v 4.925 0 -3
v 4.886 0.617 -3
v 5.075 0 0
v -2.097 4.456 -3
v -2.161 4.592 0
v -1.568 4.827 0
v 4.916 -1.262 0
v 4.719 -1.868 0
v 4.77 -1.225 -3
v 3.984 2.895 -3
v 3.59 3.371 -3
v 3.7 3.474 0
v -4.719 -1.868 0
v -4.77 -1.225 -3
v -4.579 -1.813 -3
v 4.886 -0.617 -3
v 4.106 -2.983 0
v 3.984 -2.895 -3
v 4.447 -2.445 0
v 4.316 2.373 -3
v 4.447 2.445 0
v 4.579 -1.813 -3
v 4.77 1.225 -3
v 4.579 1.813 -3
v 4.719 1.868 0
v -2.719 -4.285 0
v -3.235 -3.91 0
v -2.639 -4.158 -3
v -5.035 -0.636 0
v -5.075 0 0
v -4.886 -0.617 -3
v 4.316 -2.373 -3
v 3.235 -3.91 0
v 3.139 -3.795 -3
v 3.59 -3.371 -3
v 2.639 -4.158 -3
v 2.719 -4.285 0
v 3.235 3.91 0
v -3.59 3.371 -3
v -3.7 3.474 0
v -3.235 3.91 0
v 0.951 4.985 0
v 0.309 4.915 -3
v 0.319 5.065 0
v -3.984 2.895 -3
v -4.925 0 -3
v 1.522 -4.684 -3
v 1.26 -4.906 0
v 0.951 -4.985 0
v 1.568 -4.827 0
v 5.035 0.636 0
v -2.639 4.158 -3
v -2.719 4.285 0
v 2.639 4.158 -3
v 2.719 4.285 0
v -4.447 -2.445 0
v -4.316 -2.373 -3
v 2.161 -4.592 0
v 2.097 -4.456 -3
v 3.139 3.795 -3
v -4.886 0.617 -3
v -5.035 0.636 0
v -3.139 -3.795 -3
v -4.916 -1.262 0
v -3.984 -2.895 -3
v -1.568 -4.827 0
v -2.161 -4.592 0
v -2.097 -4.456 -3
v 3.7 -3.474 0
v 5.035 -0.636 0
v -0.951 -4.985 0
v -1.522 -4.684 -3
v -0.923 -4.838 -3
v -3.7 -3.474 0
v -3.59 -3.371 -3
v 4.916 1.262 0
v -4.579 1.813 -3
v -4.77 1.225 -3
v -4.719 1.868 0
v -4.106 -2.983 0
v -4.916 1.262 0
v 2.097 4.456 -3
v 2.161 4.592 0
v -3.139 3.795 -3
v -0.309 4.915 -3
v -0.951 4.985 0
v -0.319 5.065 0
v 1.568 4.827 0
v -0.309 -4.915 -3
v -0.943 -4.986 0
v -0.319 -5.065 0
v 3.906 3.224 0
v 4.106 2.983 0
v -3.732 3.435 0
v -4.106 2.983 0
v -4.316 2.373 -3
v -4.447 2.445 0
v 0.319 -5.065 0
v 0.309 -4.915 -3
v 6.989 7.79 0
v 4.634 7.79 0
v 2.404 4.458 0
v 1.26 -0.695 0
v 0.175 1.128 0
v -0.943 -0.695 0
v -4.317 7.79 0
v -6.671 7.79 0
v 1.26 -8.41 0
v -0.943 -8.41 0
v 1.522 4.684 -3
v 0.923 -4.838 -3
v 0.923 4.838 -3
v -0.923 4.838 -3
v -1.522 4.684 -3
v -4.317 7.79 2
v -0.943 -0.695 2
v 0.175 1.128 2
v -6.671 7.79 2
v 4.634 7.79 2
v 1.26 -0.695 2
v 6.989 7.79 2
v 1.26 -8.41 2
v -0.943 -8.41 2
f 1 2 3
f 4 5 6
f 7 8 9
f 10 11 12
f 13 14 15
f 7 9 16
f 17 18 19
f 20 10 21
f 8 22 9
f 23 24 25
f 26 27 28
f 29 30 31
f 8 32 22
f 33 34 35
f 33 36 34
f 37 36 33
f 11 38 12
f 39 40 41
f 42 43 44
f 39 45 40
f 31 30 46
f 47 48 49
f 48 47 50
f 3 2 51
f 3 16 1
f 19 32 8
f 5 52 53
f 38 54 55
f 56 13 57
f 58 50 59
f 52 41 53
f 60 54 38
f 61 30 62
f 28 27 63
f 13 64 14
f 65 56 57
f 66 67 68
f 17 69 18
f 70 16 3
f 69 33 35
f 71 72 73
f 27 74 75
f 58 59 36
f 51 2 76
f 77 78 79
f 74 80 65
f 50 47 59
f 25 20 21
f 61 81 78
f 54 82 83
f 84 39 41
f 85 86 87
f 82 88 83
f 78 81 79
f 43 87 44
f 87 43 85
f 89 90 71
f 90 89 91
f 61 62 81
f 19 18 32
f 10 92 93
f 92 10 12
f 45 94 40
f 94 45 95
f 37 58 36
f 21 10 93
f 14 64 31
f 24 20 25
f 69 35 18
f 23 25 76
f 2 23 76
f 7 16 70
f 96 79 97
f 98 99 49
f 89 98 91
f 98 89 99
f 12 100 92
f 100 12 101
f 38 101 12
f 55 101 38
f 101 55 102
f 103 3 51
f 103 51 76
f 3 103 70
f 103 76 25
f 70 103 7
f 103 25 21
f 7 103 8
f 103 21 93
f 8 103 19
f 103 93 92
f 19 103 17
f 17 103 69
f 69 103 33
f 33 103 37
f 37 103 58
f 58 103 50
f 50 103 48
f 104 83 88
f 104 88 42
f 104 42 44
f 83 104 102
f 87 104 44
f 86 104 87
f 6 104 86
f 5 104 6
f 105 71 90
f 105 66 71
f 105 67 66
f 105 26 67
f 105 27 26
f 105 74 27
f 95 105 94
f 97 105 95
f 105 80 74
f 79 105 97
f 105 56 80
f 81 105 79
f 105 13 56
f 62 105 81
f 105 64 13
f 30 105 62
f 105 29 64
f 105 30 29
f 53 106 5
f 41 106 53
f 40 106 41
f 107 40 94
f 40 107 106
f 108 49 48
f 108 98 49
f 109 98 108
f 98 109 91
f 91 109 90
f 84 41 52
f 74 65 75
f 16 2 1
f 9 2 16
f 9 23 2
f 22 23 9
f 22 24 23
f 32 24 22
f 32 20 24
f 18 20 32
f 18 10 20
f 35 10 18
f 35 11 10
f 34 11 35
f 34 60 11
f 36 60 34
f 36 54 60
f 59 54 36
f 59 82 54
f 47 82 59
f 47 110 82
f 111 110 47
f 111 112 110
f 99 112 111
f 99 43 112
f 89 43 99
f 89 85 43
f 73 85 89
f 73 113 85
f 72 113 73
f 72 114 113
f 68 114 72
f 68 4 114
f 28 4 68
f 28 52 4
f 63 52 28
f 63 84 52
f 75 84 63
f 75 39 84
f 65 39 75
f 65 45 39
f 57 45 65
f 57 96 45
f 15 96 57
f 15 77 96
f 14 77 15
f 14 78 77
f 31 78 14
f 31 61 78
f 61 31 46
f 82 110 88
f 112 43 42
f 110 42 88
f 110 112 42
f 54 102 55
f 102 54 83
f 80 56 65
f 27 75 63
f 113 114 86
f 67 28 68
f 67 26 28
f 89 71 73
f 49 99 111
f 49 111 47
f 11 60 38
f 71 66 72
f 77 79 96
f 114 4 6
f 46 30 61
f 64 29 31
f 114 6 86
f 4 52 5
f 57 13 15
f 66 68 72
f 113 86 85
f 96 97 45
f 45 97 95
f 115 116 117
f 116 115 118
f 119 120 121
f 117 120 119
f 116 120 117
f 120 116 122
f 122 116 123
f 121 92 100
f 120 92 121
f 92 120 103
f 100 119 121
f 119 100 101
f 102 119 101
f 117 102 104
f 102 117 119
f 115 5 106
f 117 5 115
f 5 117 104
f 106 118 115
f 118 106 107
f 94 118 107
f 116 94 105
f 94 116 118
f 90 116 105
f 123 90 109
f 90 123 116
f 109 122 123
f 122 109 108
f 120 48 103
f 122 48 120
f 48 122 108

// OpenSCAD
$fn = 50;

difference() {
	union() {
		translate(v = [0, 0, -3.0]) {
			cylinder(h = 3, r1 = 4.925, r2 = 5.075);
		}
		translate(v = [0, -0.5, 0]) {
			linear_extrude(height = 2) {
				text(font = "Webdings", halign = "center", size = 16, text = "Y", valign = "center");
			}
		}
	}
	union();
}
